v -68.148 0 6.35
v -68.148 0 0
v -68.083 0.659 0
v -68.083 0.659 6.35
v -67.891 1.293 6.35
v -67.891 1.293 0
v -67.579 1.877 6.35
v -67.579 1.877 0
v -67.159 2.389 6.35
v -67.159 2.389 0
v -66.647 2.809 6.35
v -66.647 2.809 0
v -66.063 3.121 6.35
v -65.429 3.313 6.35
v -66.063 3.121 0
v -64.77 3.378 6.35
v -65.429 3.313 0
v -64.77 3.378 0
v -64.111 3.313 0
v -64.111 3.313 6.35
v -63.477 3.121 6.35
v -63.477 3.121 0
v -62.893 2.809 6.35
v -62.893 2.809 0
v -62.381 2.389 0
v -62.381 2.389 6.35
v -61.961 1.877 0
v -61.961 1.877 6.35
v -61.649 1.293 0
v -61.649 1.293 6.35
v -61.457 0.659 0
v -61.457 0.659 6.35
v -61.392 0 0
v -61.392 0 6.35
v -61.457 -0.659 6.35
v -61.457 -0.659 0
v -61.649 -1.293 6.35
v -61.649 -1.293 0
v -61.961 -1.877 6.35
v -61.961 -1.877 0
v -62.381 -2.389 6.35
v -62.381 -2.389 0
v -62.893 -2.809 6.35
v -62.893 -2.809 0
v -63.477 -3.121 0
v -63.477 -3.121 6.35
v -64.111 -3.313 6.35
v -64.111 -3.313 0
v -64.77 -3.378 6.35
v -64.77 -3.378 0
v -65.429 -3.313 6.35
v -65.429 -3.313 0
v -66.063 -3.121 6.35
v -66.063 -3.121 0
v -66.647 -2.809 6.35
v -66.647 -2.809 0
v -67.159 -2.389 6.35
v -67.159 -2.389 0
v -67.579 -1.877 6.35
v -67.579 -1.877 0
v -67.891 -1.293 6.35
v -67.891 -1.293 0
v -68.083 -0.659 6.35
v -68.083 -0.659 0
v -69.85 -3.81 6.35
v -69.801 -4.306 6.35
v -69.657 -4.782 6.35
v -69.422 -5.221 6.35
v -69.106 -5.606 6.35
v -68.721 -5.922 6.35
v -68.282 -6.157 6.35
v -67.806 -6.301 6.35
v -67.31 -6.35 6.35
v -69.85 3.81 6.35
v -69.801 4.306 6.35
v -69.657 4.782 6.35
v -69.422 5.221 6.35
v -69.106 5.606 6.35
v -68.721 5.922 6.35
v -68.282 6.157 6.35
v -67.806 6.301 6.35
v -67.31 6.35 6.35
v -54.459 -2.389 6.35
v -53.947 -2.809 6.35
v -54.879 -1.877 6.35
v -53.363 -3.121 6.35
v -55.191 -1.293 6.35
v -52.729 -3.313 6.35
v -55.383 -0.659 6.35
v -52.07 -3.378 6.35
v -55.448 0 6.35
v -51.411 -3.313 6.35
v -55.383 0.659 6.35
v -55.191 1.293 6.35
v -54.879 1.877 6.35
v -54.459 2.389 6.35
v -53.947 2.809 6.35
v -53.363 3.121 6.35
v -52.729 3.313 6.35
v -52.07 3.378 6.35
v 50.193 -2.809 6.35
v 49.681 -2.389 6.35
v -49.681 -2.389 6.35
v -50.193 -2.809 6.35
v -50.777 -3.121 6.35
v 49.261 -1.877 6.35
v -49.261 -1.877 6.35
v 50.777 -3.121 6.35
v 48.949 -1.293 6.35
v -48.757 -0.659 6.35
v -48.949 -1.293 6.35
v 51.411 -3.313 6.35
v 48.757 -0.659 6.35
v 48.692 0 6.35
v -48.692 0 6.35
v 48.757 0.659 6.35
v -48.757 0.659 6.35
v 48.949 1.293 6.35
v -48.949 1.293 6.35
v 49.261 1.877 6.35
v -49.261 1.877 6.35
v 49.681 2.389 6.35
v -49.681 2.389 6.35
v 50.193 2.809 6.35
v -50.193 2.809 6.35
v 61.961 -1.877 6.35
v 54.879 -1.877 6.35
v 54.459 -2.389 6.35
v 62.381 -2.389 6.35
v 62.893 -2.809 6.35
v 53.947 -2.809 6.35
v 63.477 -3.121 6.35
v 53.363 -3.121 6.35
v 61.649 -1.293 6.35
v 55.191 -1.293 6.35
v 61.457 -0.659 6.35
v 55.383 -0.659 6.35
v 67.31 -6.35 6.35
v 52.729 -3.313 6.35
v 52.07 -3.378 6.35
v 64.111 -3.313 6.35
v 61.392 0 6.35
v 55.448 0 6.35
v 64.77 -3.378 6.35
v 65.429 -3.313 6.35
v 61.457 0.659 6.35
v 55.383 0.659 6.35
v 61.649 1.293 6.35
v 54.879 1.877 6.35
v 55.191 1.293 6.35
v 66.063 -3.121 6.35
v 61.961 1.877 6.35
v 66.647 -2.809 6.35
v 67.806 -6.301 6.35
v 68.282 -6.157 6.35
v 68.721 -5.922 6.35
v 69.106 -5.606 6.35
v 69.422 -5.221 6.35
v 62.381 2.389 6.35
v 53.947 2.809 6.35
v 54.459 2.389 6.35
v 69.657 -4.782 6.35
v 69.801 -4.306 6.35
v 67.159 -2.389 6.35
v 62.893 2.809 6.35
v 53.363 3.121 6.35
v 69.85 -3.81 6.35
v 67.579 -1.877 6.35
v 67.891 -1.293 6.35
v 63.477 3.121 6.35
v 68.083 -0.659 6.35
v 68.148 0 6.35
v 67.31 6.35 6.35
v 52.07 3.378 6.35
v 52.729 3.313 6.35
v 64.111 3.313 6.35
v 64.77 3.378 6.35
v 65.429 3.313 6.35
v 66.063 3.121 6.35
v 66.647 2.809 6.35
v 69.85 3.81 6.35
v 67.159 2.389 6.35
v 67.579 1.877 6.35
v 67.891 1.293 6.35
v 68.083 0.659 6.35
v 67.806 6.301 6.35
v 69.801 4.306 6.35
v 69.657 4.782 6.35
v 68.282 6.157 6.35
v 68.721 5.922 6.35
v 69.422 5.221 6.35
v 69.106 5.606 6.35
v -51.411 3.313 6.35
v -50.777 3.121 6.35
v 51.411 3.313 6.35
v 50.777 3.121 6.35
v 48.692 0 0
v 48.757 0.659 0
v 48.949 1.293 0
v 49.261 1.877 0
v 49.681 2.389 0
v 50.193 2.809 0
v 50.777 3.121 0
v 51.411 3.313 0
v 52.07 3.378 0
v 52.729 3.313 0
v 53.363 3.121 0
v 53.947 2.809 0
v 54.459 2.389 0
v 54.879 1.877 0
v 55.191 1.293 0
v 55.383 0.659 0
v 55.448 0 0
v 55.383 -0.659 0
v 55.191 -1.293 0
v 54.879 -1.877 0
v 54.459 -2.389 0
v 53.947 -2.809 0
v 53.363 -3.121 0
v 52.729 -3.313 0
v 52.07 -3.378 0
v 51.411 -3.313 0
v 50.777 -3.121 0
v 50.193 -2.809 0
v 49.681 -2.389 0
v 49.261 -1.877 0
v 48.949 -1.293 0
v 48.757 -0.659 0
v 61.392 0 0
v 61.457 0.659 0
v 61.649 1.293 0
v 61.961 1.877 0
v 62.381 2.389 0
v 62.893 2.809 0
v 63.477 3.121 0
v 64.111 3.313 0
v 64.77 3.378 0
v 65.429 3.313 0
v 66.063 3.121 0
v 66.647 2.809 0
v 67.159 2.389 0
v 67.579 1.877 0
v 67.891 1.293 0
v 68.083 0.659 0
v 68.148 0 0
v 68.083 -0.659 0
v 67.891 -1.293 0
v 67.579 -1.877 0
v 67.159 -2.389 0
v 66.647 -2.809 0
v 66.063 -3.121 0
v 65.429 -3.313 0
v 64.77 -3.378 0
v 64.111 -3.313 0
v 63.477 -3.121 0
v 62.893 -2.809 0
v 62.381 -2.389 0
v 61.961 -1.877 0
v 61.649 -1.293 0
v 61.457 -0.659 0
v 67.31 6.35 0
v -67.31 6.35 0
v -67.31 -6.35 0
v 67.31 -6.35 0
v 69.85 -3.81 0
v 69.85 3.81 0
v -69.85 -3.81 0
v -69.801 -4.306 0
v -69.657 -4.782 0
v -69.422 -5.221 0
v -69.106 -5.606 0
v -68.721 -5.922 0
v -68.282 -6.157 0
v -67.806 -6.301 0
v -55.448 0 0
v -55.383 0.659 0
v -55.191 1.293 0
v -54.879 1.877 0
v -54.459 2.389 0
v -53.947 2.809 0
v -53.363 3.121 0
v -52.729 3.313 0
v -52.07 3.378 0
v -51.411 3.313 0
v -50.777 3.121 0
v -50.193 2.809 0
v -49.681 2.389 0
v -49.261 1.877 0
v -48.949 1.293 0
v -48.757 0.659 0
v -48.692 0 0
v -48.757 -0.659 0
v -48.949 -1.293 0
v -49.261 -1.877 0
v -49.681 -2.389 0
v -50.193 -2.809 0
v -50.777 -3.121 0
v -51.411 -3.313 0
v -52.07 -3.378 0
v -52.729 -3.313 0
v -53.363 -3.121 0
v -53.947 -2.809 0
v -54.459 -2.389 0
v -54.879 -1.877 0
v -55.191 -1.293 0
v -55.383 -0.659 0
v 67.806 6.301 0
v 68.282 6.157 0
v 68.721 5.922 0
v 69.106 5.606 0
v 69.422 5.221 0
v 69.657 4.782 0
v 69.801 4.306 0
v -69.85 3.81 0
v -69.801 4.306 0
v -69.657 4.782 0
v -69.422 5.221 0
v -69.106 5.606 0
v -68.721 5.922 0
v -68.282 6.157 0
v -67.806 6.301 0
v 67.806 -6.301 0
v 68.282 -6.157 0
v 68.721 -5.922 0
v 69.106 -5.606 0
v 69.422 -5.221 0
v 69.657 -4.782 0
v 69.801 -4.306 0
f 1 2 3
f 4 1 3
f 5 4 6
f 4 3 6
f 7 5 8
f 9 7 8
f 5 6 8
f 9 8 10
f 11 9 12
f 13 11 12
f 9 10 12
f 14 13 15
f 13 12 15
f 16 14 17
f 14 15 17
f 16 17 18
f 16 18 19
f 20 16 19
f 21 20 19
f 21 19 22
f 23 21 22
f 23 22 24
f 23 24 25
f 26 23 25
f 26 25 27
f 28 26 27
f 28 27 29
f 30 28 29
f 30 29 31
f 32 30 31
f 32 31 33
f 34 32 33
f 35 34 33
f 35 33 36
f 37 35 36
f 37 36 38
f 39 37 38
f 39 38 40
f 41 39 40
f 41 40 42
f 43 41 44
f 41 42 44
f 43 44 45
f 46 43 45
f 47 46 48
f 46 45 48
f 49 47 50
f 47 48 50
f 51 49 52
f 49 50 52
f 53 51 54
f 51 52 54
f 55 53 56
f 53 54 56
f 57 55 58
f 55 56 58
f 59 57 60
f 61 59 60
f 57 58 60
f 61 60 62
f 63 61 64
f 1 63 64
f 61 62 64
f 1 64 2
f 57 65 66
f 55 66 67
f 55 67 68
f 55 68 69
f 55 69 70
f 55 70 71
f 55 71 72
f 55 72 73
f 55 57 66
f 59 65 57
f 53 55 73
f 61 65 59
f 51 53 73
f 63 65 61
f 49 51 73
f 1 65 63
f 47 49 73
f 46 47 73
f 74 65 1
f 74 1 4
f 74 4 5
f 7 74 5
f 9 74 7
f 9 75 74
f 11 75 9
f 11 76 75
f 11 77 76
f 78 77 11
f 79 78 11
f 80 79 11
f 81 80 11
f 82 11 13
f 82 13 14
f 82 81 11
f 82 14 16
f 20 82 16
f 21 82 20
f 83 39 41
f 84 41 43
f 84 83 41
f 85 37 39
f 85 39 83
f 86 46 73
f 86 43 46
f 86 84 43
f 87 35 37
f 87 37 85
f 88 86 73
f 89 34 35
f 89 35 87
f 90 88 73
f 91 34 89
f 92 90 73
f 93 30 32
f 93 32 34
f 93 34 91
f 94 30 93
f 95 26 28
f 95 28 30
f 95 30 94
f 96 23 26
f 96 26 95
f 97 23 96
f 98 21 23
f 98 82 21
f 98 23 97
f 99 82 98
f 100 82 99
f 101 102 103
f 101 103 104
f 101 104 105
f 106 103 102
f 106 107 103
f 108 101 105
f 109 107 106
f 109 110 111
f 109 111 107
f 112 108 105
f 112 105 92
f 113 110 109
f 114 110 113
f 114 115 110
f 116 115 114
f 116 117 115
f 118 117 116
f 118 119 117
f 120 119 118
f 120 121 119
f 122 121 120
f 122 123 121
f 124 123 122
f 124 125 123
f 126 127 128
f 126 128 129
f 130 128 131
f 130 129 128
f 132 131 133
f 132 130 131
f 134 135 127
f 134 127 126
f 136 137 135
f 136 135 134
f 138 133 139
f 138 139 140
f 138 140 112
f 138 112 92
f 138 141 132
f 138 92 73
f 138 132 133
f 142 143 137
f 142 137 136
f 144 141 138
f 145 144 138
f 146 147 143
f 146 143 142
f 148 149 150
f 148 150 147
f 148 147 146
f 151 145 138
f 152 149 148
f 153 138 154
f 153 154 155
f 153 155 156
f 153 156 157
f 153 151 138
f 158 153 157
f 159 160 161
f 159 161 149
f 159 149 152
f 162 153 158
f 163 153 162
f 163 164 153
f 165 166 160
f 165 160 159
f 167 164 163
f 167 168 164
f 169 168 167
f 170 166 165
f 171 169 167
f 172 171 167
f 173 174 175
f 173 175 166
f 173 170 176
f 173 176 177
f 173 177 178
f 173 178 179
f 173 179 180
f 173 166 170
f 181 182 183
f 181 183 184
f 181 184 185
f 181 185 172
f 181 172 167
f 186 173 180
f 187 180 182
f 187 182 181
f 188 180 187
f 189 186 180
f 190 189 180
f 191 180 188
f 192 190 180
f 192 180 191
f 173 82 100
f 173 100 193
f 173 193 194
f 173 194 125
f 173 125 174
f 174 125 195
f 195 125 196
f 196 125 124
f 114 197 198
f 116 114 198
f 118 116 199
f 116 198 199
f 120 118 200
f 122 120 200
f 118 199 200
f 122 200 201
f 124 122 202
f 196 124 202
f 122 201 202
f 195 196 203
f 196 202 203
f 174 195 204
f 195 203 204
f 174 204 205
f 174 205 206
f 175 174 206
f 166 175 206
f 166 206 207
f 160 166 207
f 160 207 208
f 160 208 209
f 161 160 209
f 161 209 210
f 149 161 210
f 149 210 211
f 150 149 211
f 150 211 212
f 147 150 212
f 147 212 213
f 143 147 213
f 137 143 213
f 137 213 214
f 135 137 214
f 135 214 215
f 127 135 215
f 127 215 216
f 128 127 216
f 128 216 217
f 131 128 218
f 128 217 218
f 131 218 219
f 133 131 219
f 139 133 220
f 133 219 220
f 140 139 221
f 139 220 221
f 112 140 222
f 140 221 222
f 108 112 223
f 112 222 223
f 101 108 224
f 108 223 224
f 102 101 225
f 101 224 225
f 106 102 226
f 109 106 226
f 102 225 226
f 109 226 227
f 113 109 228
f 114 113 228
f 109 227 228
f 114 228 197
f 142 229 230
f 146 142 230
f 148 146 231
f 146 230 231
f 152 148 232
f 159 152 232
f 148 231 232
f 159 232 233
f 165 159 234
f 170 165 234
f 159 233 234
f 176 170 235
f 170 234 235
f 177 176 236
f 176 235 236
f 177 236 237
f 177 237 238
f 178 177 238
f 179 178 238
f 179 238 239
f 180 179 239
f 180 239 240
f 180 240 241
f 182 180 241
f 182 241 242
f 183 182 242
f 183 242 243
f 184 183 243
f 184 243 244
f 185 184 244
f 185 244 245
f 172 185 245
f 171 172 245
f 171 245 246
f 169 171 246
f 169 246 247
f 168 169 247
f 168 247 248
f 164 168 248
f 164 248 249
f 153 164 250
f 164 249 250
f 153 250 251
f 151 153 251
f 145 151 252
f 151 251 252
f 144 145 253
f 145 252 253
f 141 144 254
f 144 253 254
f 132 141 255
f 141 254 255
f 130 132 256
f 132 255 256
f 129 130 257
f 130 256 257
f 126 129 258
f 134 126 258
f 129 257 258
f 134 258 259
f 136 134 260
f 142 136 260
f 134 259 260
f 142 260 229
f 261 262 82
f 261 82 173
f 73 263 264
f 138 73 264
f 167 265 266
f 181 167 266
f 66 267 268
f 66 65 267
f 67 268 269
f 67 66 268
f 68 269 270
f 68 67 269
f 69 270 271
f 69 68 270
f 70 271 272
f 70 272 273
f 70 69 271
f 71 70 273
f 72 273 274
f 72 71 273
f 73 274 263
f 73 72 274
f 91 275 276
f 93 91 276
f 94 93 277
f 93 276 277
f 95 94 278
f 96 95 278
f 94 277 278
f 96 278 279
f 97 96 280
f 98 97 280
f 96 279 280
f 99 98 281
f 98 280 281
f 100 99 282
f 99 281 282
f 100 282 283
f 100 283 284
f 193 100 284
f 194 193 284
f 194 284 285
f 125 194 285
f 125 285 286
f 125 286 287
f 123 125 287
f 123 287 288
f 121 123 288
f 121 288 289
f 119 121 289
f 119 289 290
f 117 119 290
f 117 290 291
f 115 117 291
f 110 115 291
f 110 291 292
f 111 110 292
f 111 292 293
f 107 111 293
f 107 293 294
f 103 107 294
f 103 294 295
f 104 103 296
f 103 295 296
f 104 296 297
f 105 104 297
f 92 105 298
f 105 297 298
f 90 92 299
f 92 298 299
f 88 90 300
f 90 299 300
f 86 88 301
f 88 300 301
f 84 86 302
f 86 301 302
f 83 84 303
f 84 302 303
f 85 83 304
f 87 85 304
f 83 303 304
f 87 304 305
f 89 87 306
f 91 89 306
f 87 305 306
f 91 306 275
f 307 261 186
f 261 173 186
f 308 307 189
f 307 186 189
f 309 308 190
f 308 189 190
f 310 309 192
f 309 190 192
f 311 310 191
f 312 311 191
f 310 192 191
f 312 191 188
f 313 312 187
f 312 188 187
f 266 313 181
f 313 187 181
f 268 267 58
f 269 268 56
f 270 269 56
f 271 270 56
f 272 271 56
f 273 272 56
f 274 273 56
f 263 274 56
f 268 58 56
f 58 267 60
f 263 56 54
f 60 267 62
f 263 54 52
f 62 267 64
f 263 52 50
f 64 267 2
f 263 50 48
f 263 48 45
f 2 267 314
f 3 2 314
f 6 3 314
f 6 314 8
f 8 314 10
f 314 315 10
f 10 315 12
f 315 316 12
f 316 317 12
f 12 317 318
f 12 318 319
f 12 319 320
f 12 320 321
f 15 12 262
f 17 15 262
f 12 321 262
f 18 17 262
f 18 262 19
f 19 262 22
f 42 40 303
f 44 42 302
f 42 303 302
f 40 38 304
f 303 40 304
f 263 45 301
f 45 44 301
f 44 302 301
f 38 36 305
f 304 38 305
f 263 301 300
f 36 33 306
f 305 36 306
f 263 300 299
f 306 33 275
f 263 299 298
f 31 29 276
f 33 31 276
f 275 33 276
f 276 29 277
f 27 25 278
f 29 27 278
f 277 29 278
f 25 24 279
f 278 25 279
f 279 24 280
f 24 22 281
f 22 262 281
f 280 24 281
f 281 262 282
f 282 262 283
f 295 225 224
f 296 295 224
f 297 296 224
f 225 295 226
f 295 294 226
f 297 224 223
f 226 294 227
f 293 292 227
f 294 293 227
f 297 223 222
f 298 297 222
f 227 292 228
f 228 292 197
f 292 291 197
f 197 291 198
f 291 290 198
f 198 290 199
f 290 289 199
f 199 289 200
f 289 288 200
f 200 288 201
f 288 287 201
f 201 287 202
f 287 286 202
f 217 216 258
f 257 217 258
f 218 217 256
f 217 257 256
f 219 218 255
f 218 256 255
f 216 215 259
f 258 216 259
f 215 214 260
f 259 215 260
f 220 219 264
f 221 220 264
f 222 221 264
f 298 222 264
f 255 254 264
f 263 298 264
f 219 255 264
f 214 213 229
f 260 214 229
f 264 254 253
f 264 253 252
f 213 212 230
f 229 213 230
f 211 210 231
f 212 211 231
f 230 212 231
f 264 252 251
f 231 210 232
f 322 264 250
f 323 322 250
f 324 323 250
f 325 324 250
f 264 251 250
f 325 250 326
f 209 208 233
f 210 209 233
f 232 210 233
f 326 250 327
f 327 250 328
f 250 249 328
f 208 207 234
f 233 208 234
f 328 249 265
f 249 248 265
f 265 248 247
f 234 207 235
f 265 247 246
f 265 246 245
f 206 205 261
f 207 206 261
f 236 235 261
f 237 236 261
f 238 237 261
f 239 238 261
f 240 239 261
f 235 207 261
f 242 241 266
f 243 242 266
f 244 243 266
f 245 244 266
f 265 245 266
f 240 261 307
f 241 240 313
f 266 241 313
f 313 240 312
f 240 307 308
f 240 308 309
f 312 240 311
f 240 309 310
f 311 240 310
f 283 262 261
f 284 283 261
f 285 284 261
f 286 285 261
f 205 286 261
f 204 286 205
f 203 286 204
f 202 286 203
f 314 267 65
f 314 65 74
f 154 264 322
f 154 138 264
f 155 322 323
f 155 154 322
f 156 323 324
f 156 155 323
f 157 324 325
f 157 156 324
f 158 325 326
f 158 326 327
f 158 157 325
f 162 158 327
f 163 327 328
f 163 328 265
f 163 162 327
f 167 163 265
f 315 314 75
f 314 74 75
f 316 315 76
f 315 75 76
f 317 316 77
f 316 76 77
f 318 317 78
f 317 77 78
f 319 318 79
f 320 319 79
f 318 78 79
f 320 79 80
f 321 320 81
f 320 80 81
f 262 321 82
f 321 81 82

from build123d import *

# Parameters (mm, degrees)
SKETCH1_W                = 139.7
SKETCH1_H                = 12.7
BOSS_EXTRUDE1_DEPTH      = 6.35
H_0_266_DIAMETER_HOLE1_D = 6.7564
FILLET1_R                = 2.54


with BuildPart() as part:
    # Sketch1 → Boss-Extrude1 (new body)
    with BuildSketch(Plane.XY):
        Rectangle(SKETCH1_W, SKETCH1_H)
    extrude(amount=BOSS_EXTRUDE1_DEPTH)

    # H (0.266) Diameter Hole1 (through all)
    with Locations(Plane.XY.offset(6.35)):
        with Locations((-64.77, 0), (-52.07, 0), (52.07, 0), (64.77, 0)):
            Hole(H_0_266_DIAMETER_HOLE1_D / 2)

    # Fillet1
    fillet1_edges = [part.edges().sort_by_distance(p)[0] for p in [
        (69.85, -6.35, 3.175),
        (-69.85, -6.35, 3.175),
        (-69.85, 6.35, 3.175),
        (69.85, 6.35, 3.175),
    ]]
    fillet(fillet1_edges, radius=FILLET1_R)


solid = part.part
